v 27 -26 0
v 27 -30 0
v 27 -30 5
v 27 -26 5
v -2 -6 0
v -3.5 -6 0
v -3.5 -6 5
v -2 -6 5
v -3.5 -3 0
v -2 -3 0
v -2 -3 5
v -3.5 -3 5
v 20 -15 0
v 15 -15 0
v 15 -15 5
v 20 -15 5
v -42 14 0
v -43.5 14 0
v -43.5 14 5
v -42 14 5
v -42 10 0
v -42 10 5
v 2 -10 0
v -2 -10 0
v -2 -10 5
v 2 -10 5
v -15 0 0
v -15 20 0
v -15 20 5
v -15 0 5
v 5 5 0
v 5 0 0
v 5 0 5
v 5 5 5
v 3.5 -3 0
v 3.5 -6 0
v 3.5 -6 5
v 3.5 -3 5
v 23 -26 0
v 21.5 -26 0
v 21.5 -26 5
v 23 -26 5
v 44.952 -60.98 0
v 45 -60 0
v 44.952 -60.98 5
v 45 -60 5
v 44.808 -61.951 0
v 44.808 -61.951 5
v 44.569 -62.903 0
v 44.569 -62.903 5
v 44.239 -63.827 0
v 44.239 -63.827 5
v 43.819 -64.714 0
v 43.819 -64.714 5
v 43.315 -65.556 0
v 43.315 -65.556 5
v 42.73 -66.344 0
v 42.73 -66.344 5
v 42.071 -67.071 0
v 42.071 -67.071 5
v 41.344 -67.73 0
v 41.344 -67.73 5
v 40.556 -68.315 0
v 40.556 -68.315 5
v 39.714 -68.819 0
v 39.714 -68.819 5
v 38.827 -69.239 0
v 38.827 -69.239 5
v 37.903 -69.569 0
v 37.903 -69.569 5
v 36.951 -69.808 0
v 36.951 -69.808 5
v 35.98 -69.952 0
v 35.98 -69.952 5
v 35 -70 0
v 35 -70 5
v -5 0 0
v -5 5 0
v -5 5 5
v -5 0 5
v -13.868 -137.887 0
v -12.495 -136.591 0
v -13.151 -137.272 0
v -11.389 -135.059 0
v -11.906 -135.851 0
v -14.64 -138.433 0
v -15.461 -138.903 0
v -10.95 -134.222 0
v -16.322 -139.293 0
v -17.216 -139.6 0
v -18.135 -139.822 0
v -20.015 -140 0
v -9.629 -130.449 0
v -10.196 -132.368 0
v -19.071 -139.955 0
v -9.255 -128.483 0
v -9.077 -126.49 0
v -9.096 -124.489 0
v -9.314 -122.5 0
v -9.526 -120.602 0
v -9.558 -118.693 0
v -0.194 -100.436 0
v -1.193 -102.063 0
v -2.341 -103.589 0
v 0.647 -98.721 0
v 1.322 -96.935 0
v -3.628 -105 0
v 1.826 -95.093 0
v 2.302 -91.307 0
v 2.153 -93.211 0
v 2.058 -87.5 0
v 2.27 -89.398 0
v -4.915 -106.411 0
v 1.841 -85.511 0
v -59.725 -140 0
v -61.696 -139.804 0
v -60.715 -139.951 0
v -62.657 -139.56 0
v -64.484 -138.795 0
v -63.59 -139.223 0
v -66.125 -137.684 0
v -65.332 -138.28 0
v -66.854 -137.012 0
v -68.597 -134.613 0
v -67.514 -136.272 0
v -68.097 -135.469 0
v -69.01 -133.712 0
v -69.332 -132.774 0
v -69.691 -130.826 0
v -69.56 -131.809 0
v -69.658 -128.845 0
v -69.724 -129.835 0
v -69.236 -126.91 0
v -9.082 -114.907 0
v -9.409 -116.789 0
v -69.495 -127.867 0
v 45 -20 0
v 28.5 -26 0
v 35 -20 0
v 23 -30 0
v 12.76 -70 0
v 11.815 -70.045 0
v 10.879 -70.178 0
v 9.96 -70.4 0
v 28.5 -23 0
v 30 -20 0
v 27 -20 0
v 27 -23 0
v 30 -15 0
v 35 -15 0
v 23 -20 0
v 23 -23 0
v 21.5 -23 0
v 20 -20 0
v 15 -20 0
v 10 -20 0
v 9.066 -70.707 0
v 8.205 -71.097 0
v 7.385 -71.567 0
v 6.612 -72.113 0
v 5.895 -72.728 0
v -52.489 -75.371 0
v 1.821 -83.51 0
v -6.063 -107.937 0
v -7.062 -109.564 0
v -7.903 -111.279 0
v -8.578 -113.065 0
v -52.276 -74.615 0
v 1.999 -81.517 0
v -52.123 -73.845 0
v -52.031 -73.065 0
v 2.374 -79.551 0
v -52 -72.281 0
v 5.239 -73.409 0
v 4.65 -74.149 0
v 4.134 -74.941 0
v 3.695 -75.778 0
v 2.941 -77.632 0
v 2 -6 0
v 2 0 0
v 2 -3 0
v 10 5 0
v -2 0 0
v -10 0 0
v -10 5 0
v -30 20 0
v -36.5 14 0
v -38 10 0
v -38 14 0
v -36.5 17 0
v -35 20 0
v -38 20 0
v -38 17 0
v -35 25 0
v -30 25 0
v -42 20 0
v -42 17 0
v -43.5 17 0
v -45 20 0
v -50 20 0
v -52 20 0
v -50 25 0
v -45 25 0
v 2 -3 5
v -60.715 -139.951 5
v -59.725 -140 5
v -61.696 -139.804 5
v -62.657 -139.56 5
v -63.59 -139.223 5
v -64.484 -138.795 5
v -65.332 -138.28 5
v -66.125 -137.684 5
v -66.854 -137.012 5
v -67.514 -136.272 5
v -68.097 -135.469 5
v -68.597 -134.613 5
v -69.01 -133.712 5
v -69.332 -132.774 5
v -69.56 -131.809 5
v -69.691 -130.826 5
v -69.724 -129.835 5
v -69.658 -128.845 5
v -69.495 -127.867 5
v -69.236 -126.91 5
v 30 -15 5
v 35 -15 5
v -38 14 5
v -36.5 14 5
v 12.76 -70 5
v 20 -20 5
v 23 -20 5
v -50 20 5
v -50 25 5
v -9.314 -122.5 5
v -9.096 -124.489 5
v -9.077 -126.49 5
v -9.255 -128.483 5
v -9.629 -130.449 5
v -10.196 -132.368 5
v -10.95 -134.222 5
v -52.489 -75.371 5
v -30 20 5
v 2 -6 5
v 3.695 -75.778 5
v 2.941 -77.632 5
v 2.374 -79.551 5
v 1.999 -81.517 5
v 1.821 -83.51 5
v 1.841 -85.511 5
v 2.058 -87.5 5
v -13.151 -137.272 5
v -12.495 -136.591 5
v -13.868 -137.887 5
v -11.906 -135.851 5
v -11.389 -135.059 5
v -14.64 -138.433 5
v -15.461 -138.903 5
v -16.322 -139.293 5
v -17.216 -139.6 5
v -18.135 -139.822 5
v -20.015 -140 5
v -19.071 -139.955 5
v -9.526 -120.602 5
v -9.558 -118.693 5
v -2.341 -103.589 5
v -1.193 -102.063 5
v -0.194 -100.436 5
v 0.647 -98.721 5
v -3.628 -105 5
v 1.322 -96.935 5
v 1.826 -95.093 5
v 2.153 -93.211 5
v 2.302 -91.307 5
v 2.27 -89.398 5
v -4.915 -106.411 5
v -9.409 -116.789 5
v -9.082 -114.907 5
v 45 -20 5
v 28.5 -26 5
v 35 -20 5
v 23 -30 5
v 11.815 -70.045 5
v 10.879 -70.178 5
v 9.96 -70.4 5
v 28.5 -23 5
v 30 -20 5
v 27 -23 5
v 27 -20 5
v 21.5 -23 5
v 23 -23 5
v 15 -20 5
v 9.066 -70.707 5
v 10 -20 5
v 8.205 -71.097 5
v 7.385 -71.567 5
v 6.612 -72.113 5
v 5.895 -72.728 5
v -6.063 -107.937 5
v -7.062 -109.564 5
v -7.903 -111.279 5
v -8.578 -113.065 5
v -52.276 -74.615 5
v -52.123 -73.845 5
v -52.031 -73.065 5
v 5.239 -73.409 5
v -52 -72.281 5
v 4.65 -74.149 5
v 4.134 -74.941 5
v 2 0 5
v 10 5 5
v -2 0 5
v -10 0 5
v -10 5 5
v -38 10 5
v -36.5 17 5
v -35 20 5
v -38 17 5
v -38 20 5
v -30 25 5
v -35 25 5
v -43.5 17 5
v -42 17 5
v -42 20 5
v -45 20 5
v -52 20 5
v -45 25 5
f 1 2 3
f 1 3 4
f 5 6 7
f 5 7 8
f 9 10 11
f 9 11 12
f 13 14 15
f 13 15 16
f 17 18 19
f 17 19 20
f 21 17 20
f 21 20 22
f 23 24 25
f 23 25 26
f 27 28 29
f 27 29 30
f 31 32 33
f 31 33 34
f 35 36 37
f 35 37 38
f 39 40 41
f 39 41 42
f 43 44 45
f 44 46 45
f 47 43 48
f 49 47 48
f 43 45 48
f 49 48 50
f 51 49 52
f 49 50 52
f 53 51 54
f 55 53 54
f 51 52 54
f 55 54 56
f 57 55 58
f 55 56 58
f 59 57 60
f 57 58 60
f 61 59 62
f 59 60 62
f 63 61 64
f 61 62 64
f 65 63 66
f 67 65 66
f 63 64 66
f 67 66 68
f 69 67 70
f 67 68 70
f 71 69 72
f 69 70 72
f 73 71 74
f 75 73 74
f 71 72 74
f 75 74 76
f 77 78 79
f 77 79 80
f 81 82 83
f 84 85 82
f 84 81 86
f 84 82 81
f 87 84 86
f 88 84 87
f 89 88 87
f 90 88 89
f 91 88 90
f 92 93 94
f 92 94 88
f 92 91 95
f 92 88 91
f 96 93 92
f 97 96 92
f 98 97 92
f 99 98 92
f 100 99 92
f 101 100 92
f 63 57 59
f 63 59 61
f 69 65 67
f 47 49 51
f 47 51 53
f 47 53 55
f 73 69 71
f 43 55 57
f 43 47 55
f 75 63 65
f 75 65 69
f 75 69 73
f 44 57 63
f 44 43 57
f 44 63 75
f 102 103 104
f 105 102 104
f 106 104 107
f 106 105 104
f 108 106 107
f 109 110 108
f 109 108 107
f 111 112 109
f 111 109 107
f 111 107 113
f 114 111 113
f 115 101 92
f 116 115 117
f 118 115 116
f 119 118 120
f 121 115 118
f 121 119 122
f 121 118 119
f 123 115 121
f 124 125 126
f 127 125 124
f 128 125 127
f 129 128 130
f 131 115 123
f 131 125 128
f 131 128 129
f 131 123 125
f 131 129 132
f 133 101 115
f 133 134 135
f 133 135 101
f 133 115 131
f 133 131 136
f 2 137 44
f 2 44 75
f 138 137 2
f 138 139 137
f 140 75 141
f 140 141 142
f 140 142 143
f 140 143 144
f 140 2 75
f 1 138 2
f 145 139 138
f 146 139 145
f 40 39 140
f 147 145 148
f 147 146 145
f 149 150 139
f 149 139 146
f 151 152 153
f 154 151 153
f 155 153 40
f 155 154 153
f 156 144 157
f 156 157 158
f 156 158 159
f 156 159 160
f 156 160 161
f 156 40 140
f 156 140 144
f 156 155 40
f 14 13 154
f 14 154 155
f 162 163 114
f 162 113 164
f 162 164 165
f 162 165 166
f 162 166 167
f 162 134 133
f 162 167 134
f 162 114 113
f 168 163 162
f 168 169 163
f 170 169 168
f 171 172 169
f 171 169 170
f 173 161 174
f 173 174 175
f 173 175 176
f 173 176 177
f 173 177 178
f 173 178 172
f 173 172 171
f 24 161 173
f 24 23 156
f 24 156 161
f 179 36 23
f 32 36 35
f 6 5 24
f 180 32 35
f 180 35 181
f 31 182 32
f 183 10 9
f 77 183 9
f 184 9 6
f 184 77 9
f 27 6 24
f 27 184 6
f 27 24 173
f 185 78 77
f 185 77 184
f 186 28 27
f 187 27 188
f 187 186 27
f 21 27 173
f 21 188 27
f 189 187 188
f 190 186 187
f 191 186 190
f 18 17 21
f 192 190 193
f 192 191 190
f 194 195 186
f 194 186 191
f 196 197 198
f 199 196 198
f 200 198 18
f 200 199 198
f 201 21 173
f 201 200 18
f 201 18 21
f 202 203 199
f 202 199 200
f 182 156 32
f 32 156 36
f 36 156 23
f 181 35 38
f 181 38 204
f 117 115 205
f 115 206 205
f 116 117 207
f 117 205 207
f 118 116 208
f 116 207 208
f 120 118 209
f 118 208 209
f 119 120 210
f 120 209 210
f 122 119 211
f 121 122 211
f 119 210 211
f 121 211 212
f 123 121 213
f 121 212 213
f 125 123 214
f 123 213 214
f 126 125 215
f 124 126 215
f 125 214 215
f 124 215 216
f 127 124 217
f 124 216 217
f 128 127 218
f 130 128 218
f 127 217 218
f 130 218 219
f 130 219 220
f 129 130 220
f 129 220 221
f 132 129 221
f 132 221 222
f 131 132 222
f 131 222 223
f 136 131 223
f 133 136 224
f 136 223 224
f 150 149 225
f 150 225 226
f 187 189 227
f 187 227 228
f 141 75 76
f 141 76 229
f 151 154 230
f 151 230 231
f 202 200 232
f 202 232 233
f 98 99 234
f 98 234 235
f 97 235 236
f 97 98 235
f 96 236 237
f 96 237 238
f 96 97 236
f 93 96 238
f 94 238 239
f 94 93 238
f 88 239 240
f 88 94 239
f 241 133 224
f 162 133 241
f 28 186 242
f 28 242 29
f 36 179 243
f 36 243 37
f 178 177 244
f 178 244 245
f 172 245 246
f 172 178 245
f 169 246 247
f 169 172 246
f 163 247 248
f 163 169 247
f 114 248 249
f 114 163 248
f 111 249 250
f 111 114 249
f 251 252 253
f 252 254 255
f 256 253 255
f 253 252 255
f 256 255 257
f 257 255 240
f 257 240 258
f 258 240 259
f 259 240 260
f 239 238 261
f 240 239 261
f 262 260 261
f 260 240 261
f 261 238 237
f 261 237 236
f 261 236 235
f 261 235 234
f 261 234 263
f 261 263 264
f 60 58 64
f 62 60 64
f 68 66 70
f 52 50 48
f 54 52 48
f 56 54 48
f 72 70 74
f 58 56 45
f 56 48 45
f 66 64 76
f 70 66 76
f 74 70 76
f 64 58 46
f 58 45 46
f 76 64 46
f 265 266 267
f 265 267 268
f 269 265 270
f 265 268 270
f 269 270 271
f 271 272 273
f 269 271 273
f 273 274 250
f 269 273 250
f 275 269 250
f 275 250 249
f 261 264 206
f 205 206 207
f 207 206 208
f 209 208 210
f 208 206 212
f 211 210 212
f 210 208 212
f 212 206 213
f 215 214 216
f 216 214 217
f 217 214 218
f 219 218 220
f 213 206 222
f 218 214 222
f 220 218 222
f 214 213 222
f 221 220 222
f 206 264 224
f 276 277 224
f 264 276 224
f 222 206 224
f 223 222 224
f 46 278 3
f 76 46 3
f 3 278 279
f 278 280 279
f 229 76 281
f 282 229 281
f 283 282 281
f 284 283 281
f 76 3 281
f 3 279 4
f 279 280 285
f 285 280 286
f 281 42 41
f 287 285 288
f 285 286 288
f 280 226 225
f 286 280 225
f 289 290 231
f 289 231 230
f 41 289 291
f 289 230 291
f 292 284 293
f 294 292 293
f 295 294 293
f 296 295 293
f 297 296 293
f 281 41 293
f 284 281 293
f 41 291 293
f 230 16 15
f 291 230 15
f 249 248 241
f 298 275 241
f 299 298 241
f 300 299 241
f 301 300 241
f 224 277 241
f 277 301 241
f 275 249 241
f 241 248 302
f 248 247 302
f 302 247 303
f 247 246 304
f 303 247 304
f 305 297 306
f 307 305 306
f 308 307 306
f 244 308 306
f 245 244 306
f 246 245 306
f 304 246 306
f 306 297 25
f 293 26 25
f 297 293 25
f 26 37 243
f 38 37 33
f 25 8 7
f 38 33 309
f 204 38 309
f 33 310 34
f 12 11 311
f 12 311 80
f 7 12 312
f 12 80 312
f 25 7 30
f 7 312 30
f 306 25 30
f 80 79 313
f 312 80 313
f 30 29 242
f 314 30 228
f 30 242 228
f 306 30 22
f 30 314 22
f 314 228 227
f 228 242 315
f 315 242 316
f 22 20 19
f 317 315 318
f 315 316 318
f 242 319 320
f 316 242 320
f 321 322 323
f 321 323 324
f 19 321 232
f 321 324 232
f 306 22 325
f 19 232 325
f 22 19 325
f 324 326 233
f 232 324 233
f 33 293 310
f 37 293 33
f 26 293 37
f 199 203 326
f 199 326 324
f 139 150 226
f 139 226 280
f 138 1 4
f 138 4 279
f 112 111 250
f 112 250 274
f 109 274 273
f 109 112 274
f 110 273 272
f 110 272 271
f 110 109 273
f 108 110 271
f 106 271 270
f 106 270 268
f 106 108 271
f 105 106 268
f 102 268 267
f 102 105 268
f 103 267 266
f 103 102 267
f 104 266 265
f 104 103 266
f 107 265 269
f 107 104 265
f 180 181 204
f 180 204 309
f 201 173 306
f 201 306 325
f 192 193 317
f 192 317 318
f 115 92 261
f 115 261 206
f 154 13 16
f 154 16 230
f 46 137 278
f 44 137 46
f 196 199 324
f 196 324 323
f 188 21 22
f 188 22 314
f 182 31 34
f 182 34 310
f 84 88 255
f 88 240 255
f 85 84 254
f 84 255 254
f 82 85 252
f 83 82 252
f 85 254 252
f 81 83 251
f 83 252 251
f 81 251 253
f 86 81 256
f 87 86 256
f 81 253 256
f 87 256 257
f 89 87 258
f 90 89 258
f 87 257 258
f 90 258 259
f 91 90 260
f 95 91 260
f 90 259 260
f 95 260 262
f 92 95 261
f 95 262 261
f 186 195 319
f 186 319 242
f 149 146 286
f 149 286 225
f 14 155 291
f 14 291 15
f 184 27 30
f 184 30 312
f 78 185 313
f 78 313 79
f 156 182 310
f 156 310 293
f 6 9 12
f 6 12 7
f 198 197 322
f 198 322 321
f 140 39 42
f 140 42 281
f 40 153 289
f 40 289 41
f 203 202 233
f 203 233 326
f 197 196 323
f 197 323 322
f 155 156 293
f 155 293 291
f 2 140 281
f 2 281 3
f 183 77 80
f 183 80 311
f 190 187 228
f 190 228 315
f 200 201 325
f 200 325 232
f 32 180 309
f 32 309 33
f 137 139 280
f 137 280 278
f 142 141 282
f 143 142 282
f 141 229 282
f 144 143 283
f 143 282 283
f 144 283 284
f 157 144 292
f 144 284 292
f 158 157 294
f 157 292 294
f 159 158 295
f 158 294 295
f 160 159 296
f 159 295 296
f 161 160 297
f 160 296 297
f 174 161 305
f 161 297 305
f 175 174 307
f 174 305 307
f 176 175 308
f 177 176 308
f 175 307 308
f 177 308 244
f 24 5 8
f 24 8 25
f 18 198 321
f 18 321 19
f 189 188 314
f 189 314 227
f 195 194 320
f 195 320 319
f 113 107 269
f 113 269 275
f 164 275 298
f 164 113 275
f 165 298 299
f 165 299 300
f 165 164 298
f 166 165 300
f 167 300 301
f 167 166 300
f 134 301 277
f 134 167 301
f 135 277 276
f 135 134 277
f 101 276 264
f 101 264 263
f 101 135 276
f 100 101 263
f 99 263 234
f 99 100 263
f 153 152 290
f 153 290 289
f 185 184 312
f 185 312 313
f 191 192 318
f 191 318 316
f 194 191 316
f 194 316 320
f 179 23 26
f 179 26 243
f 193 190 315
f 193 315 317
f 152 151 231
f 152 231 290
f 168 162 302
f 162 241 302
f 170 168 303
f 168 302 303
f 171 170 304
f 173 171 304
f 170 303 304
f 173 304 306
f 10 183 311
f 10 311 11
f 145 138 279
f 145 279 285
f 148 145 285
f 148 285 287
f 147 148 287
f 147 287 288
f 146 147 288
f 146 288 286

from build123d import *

# Parameters (mm, degrees)
BOSS_EXTRU_1_DEPTH = 5
CONG_1_R           = 10


with BuildPart() as part:
    # Esquisse1 → Boss.-Extru.1 (new body)
    with BuildSketch(Plane.XY):
        with BuildLine():
            Line((10, 0), (10, -20))
            Line((10, -20), (15, -20))
            Line((15, -20), (15, -15))
            Line((15, -15), (20, -15))
            Line((20, -15), (20, -20))
            Line((20, -20), (23, -20))
            Line((23, -20), (23, -23))
            Line((23, -23), (21.5, -23))
            Line((21.5, -23), (21.5, -26))
            Line((21.5, -26), (23, -26))
            Line((23, -26), (23, -30))
            Line((23, -30), (27, -30))
            Line((27, -30), (27, -26))
            Line((27, -26), (28.5, -26))
            Line((28.5, -26), (28.5, -23))
            Line((28.5, -23), (27, -23))
            Line((27, -23), (27, -20))
            Line((27, -20), (30, -20))
            Line((30, -20), (30, -15))
            Line((30, -15), (35, -15))
            Line((35, -15), (35, -20))
            Line((35, -20), (45, -20))
            Line((45, -20), (45, -70))
            Line((45, -70), (7.744378736, -70))
            ThreePointArc((7.744378736, -70), (2.794303084, -78.065385001), (2.058284052, -87.5))
            ThreePointArc((2.058284052, -87.5), (1.322265021, -96.934614999), (-3.627810632, -105))
            ThreePointArc((-3.627810632, -105), (-8.577886284, -113.065385001), (-9.313905316, -122.5))
            ThreePointArc((-9.313905316, -122.5), (-10.049924347, -131.934614999), (-15, -140))
            Line((-15, -140), (-73.488757473, -140))
            Line((-73.488757473, -140), (-52, -73.864404892))
            Line((-52, -73.864404892), (-52, 20))
            Line((-52, 20), (-50, 20))
            Line((-50, 20), (-50, 25))
            Line((-50, 25), (-45, 25))
            Line((-45, 25), (-45, 20))
            Line((-45, 20), (-42, 20))
            Line((-42, 20), (-42, 17))
            Line((-42, 17), (-43.5, 17))
            Line((-43.5, 17), (-43.5, 14))
            Line((-43.5, 14), (-42, 14))
            Line((-42, 14), (-42, 10))
            Line((-42, 10), (-38, 10))
            Line((-38, 10), (-38, 14))
            Line((-38, 14), (-36.5, 14))
            Line((-36.5, 14), (-36.5, 17))
            Line((-36.5, 17), (-38, 17))
            Line((-38, 17), (-38, 20))
            Line((-38, 20), (-35, 20))
            Line((-35, 20), (-35, 25))
            Line((-35, 25), (-30, 25))
            Line((-30, 25), (-30, 20))
            Line((-30, 20), (-15, 20))
            Line((-15, 20), (-15, 0))
            Line((-15, 0), (-10, 0))
            Line((-10, 0), (-10, 5))
            Line((-10, 5), (-5, 5))
            Line((-5, 5), (-5, 0))
            Line((-5, 0), (-2, 0))
            Line((-2, 0), (-2, -3))
            Line((-2, -3), (-3.5, -3))
            Line((-3.5, -3), (-3.5, -6))
            Line((-3.5, -6), (-2, -6))
            Line((-2, -6), (-2, -10))
            Line((-2, -10), (2, -10))
            Line((2, -10), (2, -6))
            Line((2, -6), (3.5, -6))
            Line((3.5, -6), (3.5, -3))
            Line((3.5, -3), (2, -3))
            Line((2, -3), (2, 0))
            Line((2, 0), (5, 0))
            Line((5, 0), (5, 5))
            Line((5, 5), (10, 5))
            Line((10, 5), (10, 0))
        make_face()
    extrude(amount=BOSS_EXTRU_1_DEPTH)

    # Congé1
    cong_1_edges = [part.edges().sort_by_distance(p)[0] for p in [
        (45, -70, 2.5),
        (7.744378736, -70, 2.5),
        (-15, -140, 2.5),
        (-73.488757473, -140, 2.5),
        (-52, -73.864404892, 2.5),
    ]]
    fillet(cong_1_edges, radius=CONG_1_R)


solid = part.part
